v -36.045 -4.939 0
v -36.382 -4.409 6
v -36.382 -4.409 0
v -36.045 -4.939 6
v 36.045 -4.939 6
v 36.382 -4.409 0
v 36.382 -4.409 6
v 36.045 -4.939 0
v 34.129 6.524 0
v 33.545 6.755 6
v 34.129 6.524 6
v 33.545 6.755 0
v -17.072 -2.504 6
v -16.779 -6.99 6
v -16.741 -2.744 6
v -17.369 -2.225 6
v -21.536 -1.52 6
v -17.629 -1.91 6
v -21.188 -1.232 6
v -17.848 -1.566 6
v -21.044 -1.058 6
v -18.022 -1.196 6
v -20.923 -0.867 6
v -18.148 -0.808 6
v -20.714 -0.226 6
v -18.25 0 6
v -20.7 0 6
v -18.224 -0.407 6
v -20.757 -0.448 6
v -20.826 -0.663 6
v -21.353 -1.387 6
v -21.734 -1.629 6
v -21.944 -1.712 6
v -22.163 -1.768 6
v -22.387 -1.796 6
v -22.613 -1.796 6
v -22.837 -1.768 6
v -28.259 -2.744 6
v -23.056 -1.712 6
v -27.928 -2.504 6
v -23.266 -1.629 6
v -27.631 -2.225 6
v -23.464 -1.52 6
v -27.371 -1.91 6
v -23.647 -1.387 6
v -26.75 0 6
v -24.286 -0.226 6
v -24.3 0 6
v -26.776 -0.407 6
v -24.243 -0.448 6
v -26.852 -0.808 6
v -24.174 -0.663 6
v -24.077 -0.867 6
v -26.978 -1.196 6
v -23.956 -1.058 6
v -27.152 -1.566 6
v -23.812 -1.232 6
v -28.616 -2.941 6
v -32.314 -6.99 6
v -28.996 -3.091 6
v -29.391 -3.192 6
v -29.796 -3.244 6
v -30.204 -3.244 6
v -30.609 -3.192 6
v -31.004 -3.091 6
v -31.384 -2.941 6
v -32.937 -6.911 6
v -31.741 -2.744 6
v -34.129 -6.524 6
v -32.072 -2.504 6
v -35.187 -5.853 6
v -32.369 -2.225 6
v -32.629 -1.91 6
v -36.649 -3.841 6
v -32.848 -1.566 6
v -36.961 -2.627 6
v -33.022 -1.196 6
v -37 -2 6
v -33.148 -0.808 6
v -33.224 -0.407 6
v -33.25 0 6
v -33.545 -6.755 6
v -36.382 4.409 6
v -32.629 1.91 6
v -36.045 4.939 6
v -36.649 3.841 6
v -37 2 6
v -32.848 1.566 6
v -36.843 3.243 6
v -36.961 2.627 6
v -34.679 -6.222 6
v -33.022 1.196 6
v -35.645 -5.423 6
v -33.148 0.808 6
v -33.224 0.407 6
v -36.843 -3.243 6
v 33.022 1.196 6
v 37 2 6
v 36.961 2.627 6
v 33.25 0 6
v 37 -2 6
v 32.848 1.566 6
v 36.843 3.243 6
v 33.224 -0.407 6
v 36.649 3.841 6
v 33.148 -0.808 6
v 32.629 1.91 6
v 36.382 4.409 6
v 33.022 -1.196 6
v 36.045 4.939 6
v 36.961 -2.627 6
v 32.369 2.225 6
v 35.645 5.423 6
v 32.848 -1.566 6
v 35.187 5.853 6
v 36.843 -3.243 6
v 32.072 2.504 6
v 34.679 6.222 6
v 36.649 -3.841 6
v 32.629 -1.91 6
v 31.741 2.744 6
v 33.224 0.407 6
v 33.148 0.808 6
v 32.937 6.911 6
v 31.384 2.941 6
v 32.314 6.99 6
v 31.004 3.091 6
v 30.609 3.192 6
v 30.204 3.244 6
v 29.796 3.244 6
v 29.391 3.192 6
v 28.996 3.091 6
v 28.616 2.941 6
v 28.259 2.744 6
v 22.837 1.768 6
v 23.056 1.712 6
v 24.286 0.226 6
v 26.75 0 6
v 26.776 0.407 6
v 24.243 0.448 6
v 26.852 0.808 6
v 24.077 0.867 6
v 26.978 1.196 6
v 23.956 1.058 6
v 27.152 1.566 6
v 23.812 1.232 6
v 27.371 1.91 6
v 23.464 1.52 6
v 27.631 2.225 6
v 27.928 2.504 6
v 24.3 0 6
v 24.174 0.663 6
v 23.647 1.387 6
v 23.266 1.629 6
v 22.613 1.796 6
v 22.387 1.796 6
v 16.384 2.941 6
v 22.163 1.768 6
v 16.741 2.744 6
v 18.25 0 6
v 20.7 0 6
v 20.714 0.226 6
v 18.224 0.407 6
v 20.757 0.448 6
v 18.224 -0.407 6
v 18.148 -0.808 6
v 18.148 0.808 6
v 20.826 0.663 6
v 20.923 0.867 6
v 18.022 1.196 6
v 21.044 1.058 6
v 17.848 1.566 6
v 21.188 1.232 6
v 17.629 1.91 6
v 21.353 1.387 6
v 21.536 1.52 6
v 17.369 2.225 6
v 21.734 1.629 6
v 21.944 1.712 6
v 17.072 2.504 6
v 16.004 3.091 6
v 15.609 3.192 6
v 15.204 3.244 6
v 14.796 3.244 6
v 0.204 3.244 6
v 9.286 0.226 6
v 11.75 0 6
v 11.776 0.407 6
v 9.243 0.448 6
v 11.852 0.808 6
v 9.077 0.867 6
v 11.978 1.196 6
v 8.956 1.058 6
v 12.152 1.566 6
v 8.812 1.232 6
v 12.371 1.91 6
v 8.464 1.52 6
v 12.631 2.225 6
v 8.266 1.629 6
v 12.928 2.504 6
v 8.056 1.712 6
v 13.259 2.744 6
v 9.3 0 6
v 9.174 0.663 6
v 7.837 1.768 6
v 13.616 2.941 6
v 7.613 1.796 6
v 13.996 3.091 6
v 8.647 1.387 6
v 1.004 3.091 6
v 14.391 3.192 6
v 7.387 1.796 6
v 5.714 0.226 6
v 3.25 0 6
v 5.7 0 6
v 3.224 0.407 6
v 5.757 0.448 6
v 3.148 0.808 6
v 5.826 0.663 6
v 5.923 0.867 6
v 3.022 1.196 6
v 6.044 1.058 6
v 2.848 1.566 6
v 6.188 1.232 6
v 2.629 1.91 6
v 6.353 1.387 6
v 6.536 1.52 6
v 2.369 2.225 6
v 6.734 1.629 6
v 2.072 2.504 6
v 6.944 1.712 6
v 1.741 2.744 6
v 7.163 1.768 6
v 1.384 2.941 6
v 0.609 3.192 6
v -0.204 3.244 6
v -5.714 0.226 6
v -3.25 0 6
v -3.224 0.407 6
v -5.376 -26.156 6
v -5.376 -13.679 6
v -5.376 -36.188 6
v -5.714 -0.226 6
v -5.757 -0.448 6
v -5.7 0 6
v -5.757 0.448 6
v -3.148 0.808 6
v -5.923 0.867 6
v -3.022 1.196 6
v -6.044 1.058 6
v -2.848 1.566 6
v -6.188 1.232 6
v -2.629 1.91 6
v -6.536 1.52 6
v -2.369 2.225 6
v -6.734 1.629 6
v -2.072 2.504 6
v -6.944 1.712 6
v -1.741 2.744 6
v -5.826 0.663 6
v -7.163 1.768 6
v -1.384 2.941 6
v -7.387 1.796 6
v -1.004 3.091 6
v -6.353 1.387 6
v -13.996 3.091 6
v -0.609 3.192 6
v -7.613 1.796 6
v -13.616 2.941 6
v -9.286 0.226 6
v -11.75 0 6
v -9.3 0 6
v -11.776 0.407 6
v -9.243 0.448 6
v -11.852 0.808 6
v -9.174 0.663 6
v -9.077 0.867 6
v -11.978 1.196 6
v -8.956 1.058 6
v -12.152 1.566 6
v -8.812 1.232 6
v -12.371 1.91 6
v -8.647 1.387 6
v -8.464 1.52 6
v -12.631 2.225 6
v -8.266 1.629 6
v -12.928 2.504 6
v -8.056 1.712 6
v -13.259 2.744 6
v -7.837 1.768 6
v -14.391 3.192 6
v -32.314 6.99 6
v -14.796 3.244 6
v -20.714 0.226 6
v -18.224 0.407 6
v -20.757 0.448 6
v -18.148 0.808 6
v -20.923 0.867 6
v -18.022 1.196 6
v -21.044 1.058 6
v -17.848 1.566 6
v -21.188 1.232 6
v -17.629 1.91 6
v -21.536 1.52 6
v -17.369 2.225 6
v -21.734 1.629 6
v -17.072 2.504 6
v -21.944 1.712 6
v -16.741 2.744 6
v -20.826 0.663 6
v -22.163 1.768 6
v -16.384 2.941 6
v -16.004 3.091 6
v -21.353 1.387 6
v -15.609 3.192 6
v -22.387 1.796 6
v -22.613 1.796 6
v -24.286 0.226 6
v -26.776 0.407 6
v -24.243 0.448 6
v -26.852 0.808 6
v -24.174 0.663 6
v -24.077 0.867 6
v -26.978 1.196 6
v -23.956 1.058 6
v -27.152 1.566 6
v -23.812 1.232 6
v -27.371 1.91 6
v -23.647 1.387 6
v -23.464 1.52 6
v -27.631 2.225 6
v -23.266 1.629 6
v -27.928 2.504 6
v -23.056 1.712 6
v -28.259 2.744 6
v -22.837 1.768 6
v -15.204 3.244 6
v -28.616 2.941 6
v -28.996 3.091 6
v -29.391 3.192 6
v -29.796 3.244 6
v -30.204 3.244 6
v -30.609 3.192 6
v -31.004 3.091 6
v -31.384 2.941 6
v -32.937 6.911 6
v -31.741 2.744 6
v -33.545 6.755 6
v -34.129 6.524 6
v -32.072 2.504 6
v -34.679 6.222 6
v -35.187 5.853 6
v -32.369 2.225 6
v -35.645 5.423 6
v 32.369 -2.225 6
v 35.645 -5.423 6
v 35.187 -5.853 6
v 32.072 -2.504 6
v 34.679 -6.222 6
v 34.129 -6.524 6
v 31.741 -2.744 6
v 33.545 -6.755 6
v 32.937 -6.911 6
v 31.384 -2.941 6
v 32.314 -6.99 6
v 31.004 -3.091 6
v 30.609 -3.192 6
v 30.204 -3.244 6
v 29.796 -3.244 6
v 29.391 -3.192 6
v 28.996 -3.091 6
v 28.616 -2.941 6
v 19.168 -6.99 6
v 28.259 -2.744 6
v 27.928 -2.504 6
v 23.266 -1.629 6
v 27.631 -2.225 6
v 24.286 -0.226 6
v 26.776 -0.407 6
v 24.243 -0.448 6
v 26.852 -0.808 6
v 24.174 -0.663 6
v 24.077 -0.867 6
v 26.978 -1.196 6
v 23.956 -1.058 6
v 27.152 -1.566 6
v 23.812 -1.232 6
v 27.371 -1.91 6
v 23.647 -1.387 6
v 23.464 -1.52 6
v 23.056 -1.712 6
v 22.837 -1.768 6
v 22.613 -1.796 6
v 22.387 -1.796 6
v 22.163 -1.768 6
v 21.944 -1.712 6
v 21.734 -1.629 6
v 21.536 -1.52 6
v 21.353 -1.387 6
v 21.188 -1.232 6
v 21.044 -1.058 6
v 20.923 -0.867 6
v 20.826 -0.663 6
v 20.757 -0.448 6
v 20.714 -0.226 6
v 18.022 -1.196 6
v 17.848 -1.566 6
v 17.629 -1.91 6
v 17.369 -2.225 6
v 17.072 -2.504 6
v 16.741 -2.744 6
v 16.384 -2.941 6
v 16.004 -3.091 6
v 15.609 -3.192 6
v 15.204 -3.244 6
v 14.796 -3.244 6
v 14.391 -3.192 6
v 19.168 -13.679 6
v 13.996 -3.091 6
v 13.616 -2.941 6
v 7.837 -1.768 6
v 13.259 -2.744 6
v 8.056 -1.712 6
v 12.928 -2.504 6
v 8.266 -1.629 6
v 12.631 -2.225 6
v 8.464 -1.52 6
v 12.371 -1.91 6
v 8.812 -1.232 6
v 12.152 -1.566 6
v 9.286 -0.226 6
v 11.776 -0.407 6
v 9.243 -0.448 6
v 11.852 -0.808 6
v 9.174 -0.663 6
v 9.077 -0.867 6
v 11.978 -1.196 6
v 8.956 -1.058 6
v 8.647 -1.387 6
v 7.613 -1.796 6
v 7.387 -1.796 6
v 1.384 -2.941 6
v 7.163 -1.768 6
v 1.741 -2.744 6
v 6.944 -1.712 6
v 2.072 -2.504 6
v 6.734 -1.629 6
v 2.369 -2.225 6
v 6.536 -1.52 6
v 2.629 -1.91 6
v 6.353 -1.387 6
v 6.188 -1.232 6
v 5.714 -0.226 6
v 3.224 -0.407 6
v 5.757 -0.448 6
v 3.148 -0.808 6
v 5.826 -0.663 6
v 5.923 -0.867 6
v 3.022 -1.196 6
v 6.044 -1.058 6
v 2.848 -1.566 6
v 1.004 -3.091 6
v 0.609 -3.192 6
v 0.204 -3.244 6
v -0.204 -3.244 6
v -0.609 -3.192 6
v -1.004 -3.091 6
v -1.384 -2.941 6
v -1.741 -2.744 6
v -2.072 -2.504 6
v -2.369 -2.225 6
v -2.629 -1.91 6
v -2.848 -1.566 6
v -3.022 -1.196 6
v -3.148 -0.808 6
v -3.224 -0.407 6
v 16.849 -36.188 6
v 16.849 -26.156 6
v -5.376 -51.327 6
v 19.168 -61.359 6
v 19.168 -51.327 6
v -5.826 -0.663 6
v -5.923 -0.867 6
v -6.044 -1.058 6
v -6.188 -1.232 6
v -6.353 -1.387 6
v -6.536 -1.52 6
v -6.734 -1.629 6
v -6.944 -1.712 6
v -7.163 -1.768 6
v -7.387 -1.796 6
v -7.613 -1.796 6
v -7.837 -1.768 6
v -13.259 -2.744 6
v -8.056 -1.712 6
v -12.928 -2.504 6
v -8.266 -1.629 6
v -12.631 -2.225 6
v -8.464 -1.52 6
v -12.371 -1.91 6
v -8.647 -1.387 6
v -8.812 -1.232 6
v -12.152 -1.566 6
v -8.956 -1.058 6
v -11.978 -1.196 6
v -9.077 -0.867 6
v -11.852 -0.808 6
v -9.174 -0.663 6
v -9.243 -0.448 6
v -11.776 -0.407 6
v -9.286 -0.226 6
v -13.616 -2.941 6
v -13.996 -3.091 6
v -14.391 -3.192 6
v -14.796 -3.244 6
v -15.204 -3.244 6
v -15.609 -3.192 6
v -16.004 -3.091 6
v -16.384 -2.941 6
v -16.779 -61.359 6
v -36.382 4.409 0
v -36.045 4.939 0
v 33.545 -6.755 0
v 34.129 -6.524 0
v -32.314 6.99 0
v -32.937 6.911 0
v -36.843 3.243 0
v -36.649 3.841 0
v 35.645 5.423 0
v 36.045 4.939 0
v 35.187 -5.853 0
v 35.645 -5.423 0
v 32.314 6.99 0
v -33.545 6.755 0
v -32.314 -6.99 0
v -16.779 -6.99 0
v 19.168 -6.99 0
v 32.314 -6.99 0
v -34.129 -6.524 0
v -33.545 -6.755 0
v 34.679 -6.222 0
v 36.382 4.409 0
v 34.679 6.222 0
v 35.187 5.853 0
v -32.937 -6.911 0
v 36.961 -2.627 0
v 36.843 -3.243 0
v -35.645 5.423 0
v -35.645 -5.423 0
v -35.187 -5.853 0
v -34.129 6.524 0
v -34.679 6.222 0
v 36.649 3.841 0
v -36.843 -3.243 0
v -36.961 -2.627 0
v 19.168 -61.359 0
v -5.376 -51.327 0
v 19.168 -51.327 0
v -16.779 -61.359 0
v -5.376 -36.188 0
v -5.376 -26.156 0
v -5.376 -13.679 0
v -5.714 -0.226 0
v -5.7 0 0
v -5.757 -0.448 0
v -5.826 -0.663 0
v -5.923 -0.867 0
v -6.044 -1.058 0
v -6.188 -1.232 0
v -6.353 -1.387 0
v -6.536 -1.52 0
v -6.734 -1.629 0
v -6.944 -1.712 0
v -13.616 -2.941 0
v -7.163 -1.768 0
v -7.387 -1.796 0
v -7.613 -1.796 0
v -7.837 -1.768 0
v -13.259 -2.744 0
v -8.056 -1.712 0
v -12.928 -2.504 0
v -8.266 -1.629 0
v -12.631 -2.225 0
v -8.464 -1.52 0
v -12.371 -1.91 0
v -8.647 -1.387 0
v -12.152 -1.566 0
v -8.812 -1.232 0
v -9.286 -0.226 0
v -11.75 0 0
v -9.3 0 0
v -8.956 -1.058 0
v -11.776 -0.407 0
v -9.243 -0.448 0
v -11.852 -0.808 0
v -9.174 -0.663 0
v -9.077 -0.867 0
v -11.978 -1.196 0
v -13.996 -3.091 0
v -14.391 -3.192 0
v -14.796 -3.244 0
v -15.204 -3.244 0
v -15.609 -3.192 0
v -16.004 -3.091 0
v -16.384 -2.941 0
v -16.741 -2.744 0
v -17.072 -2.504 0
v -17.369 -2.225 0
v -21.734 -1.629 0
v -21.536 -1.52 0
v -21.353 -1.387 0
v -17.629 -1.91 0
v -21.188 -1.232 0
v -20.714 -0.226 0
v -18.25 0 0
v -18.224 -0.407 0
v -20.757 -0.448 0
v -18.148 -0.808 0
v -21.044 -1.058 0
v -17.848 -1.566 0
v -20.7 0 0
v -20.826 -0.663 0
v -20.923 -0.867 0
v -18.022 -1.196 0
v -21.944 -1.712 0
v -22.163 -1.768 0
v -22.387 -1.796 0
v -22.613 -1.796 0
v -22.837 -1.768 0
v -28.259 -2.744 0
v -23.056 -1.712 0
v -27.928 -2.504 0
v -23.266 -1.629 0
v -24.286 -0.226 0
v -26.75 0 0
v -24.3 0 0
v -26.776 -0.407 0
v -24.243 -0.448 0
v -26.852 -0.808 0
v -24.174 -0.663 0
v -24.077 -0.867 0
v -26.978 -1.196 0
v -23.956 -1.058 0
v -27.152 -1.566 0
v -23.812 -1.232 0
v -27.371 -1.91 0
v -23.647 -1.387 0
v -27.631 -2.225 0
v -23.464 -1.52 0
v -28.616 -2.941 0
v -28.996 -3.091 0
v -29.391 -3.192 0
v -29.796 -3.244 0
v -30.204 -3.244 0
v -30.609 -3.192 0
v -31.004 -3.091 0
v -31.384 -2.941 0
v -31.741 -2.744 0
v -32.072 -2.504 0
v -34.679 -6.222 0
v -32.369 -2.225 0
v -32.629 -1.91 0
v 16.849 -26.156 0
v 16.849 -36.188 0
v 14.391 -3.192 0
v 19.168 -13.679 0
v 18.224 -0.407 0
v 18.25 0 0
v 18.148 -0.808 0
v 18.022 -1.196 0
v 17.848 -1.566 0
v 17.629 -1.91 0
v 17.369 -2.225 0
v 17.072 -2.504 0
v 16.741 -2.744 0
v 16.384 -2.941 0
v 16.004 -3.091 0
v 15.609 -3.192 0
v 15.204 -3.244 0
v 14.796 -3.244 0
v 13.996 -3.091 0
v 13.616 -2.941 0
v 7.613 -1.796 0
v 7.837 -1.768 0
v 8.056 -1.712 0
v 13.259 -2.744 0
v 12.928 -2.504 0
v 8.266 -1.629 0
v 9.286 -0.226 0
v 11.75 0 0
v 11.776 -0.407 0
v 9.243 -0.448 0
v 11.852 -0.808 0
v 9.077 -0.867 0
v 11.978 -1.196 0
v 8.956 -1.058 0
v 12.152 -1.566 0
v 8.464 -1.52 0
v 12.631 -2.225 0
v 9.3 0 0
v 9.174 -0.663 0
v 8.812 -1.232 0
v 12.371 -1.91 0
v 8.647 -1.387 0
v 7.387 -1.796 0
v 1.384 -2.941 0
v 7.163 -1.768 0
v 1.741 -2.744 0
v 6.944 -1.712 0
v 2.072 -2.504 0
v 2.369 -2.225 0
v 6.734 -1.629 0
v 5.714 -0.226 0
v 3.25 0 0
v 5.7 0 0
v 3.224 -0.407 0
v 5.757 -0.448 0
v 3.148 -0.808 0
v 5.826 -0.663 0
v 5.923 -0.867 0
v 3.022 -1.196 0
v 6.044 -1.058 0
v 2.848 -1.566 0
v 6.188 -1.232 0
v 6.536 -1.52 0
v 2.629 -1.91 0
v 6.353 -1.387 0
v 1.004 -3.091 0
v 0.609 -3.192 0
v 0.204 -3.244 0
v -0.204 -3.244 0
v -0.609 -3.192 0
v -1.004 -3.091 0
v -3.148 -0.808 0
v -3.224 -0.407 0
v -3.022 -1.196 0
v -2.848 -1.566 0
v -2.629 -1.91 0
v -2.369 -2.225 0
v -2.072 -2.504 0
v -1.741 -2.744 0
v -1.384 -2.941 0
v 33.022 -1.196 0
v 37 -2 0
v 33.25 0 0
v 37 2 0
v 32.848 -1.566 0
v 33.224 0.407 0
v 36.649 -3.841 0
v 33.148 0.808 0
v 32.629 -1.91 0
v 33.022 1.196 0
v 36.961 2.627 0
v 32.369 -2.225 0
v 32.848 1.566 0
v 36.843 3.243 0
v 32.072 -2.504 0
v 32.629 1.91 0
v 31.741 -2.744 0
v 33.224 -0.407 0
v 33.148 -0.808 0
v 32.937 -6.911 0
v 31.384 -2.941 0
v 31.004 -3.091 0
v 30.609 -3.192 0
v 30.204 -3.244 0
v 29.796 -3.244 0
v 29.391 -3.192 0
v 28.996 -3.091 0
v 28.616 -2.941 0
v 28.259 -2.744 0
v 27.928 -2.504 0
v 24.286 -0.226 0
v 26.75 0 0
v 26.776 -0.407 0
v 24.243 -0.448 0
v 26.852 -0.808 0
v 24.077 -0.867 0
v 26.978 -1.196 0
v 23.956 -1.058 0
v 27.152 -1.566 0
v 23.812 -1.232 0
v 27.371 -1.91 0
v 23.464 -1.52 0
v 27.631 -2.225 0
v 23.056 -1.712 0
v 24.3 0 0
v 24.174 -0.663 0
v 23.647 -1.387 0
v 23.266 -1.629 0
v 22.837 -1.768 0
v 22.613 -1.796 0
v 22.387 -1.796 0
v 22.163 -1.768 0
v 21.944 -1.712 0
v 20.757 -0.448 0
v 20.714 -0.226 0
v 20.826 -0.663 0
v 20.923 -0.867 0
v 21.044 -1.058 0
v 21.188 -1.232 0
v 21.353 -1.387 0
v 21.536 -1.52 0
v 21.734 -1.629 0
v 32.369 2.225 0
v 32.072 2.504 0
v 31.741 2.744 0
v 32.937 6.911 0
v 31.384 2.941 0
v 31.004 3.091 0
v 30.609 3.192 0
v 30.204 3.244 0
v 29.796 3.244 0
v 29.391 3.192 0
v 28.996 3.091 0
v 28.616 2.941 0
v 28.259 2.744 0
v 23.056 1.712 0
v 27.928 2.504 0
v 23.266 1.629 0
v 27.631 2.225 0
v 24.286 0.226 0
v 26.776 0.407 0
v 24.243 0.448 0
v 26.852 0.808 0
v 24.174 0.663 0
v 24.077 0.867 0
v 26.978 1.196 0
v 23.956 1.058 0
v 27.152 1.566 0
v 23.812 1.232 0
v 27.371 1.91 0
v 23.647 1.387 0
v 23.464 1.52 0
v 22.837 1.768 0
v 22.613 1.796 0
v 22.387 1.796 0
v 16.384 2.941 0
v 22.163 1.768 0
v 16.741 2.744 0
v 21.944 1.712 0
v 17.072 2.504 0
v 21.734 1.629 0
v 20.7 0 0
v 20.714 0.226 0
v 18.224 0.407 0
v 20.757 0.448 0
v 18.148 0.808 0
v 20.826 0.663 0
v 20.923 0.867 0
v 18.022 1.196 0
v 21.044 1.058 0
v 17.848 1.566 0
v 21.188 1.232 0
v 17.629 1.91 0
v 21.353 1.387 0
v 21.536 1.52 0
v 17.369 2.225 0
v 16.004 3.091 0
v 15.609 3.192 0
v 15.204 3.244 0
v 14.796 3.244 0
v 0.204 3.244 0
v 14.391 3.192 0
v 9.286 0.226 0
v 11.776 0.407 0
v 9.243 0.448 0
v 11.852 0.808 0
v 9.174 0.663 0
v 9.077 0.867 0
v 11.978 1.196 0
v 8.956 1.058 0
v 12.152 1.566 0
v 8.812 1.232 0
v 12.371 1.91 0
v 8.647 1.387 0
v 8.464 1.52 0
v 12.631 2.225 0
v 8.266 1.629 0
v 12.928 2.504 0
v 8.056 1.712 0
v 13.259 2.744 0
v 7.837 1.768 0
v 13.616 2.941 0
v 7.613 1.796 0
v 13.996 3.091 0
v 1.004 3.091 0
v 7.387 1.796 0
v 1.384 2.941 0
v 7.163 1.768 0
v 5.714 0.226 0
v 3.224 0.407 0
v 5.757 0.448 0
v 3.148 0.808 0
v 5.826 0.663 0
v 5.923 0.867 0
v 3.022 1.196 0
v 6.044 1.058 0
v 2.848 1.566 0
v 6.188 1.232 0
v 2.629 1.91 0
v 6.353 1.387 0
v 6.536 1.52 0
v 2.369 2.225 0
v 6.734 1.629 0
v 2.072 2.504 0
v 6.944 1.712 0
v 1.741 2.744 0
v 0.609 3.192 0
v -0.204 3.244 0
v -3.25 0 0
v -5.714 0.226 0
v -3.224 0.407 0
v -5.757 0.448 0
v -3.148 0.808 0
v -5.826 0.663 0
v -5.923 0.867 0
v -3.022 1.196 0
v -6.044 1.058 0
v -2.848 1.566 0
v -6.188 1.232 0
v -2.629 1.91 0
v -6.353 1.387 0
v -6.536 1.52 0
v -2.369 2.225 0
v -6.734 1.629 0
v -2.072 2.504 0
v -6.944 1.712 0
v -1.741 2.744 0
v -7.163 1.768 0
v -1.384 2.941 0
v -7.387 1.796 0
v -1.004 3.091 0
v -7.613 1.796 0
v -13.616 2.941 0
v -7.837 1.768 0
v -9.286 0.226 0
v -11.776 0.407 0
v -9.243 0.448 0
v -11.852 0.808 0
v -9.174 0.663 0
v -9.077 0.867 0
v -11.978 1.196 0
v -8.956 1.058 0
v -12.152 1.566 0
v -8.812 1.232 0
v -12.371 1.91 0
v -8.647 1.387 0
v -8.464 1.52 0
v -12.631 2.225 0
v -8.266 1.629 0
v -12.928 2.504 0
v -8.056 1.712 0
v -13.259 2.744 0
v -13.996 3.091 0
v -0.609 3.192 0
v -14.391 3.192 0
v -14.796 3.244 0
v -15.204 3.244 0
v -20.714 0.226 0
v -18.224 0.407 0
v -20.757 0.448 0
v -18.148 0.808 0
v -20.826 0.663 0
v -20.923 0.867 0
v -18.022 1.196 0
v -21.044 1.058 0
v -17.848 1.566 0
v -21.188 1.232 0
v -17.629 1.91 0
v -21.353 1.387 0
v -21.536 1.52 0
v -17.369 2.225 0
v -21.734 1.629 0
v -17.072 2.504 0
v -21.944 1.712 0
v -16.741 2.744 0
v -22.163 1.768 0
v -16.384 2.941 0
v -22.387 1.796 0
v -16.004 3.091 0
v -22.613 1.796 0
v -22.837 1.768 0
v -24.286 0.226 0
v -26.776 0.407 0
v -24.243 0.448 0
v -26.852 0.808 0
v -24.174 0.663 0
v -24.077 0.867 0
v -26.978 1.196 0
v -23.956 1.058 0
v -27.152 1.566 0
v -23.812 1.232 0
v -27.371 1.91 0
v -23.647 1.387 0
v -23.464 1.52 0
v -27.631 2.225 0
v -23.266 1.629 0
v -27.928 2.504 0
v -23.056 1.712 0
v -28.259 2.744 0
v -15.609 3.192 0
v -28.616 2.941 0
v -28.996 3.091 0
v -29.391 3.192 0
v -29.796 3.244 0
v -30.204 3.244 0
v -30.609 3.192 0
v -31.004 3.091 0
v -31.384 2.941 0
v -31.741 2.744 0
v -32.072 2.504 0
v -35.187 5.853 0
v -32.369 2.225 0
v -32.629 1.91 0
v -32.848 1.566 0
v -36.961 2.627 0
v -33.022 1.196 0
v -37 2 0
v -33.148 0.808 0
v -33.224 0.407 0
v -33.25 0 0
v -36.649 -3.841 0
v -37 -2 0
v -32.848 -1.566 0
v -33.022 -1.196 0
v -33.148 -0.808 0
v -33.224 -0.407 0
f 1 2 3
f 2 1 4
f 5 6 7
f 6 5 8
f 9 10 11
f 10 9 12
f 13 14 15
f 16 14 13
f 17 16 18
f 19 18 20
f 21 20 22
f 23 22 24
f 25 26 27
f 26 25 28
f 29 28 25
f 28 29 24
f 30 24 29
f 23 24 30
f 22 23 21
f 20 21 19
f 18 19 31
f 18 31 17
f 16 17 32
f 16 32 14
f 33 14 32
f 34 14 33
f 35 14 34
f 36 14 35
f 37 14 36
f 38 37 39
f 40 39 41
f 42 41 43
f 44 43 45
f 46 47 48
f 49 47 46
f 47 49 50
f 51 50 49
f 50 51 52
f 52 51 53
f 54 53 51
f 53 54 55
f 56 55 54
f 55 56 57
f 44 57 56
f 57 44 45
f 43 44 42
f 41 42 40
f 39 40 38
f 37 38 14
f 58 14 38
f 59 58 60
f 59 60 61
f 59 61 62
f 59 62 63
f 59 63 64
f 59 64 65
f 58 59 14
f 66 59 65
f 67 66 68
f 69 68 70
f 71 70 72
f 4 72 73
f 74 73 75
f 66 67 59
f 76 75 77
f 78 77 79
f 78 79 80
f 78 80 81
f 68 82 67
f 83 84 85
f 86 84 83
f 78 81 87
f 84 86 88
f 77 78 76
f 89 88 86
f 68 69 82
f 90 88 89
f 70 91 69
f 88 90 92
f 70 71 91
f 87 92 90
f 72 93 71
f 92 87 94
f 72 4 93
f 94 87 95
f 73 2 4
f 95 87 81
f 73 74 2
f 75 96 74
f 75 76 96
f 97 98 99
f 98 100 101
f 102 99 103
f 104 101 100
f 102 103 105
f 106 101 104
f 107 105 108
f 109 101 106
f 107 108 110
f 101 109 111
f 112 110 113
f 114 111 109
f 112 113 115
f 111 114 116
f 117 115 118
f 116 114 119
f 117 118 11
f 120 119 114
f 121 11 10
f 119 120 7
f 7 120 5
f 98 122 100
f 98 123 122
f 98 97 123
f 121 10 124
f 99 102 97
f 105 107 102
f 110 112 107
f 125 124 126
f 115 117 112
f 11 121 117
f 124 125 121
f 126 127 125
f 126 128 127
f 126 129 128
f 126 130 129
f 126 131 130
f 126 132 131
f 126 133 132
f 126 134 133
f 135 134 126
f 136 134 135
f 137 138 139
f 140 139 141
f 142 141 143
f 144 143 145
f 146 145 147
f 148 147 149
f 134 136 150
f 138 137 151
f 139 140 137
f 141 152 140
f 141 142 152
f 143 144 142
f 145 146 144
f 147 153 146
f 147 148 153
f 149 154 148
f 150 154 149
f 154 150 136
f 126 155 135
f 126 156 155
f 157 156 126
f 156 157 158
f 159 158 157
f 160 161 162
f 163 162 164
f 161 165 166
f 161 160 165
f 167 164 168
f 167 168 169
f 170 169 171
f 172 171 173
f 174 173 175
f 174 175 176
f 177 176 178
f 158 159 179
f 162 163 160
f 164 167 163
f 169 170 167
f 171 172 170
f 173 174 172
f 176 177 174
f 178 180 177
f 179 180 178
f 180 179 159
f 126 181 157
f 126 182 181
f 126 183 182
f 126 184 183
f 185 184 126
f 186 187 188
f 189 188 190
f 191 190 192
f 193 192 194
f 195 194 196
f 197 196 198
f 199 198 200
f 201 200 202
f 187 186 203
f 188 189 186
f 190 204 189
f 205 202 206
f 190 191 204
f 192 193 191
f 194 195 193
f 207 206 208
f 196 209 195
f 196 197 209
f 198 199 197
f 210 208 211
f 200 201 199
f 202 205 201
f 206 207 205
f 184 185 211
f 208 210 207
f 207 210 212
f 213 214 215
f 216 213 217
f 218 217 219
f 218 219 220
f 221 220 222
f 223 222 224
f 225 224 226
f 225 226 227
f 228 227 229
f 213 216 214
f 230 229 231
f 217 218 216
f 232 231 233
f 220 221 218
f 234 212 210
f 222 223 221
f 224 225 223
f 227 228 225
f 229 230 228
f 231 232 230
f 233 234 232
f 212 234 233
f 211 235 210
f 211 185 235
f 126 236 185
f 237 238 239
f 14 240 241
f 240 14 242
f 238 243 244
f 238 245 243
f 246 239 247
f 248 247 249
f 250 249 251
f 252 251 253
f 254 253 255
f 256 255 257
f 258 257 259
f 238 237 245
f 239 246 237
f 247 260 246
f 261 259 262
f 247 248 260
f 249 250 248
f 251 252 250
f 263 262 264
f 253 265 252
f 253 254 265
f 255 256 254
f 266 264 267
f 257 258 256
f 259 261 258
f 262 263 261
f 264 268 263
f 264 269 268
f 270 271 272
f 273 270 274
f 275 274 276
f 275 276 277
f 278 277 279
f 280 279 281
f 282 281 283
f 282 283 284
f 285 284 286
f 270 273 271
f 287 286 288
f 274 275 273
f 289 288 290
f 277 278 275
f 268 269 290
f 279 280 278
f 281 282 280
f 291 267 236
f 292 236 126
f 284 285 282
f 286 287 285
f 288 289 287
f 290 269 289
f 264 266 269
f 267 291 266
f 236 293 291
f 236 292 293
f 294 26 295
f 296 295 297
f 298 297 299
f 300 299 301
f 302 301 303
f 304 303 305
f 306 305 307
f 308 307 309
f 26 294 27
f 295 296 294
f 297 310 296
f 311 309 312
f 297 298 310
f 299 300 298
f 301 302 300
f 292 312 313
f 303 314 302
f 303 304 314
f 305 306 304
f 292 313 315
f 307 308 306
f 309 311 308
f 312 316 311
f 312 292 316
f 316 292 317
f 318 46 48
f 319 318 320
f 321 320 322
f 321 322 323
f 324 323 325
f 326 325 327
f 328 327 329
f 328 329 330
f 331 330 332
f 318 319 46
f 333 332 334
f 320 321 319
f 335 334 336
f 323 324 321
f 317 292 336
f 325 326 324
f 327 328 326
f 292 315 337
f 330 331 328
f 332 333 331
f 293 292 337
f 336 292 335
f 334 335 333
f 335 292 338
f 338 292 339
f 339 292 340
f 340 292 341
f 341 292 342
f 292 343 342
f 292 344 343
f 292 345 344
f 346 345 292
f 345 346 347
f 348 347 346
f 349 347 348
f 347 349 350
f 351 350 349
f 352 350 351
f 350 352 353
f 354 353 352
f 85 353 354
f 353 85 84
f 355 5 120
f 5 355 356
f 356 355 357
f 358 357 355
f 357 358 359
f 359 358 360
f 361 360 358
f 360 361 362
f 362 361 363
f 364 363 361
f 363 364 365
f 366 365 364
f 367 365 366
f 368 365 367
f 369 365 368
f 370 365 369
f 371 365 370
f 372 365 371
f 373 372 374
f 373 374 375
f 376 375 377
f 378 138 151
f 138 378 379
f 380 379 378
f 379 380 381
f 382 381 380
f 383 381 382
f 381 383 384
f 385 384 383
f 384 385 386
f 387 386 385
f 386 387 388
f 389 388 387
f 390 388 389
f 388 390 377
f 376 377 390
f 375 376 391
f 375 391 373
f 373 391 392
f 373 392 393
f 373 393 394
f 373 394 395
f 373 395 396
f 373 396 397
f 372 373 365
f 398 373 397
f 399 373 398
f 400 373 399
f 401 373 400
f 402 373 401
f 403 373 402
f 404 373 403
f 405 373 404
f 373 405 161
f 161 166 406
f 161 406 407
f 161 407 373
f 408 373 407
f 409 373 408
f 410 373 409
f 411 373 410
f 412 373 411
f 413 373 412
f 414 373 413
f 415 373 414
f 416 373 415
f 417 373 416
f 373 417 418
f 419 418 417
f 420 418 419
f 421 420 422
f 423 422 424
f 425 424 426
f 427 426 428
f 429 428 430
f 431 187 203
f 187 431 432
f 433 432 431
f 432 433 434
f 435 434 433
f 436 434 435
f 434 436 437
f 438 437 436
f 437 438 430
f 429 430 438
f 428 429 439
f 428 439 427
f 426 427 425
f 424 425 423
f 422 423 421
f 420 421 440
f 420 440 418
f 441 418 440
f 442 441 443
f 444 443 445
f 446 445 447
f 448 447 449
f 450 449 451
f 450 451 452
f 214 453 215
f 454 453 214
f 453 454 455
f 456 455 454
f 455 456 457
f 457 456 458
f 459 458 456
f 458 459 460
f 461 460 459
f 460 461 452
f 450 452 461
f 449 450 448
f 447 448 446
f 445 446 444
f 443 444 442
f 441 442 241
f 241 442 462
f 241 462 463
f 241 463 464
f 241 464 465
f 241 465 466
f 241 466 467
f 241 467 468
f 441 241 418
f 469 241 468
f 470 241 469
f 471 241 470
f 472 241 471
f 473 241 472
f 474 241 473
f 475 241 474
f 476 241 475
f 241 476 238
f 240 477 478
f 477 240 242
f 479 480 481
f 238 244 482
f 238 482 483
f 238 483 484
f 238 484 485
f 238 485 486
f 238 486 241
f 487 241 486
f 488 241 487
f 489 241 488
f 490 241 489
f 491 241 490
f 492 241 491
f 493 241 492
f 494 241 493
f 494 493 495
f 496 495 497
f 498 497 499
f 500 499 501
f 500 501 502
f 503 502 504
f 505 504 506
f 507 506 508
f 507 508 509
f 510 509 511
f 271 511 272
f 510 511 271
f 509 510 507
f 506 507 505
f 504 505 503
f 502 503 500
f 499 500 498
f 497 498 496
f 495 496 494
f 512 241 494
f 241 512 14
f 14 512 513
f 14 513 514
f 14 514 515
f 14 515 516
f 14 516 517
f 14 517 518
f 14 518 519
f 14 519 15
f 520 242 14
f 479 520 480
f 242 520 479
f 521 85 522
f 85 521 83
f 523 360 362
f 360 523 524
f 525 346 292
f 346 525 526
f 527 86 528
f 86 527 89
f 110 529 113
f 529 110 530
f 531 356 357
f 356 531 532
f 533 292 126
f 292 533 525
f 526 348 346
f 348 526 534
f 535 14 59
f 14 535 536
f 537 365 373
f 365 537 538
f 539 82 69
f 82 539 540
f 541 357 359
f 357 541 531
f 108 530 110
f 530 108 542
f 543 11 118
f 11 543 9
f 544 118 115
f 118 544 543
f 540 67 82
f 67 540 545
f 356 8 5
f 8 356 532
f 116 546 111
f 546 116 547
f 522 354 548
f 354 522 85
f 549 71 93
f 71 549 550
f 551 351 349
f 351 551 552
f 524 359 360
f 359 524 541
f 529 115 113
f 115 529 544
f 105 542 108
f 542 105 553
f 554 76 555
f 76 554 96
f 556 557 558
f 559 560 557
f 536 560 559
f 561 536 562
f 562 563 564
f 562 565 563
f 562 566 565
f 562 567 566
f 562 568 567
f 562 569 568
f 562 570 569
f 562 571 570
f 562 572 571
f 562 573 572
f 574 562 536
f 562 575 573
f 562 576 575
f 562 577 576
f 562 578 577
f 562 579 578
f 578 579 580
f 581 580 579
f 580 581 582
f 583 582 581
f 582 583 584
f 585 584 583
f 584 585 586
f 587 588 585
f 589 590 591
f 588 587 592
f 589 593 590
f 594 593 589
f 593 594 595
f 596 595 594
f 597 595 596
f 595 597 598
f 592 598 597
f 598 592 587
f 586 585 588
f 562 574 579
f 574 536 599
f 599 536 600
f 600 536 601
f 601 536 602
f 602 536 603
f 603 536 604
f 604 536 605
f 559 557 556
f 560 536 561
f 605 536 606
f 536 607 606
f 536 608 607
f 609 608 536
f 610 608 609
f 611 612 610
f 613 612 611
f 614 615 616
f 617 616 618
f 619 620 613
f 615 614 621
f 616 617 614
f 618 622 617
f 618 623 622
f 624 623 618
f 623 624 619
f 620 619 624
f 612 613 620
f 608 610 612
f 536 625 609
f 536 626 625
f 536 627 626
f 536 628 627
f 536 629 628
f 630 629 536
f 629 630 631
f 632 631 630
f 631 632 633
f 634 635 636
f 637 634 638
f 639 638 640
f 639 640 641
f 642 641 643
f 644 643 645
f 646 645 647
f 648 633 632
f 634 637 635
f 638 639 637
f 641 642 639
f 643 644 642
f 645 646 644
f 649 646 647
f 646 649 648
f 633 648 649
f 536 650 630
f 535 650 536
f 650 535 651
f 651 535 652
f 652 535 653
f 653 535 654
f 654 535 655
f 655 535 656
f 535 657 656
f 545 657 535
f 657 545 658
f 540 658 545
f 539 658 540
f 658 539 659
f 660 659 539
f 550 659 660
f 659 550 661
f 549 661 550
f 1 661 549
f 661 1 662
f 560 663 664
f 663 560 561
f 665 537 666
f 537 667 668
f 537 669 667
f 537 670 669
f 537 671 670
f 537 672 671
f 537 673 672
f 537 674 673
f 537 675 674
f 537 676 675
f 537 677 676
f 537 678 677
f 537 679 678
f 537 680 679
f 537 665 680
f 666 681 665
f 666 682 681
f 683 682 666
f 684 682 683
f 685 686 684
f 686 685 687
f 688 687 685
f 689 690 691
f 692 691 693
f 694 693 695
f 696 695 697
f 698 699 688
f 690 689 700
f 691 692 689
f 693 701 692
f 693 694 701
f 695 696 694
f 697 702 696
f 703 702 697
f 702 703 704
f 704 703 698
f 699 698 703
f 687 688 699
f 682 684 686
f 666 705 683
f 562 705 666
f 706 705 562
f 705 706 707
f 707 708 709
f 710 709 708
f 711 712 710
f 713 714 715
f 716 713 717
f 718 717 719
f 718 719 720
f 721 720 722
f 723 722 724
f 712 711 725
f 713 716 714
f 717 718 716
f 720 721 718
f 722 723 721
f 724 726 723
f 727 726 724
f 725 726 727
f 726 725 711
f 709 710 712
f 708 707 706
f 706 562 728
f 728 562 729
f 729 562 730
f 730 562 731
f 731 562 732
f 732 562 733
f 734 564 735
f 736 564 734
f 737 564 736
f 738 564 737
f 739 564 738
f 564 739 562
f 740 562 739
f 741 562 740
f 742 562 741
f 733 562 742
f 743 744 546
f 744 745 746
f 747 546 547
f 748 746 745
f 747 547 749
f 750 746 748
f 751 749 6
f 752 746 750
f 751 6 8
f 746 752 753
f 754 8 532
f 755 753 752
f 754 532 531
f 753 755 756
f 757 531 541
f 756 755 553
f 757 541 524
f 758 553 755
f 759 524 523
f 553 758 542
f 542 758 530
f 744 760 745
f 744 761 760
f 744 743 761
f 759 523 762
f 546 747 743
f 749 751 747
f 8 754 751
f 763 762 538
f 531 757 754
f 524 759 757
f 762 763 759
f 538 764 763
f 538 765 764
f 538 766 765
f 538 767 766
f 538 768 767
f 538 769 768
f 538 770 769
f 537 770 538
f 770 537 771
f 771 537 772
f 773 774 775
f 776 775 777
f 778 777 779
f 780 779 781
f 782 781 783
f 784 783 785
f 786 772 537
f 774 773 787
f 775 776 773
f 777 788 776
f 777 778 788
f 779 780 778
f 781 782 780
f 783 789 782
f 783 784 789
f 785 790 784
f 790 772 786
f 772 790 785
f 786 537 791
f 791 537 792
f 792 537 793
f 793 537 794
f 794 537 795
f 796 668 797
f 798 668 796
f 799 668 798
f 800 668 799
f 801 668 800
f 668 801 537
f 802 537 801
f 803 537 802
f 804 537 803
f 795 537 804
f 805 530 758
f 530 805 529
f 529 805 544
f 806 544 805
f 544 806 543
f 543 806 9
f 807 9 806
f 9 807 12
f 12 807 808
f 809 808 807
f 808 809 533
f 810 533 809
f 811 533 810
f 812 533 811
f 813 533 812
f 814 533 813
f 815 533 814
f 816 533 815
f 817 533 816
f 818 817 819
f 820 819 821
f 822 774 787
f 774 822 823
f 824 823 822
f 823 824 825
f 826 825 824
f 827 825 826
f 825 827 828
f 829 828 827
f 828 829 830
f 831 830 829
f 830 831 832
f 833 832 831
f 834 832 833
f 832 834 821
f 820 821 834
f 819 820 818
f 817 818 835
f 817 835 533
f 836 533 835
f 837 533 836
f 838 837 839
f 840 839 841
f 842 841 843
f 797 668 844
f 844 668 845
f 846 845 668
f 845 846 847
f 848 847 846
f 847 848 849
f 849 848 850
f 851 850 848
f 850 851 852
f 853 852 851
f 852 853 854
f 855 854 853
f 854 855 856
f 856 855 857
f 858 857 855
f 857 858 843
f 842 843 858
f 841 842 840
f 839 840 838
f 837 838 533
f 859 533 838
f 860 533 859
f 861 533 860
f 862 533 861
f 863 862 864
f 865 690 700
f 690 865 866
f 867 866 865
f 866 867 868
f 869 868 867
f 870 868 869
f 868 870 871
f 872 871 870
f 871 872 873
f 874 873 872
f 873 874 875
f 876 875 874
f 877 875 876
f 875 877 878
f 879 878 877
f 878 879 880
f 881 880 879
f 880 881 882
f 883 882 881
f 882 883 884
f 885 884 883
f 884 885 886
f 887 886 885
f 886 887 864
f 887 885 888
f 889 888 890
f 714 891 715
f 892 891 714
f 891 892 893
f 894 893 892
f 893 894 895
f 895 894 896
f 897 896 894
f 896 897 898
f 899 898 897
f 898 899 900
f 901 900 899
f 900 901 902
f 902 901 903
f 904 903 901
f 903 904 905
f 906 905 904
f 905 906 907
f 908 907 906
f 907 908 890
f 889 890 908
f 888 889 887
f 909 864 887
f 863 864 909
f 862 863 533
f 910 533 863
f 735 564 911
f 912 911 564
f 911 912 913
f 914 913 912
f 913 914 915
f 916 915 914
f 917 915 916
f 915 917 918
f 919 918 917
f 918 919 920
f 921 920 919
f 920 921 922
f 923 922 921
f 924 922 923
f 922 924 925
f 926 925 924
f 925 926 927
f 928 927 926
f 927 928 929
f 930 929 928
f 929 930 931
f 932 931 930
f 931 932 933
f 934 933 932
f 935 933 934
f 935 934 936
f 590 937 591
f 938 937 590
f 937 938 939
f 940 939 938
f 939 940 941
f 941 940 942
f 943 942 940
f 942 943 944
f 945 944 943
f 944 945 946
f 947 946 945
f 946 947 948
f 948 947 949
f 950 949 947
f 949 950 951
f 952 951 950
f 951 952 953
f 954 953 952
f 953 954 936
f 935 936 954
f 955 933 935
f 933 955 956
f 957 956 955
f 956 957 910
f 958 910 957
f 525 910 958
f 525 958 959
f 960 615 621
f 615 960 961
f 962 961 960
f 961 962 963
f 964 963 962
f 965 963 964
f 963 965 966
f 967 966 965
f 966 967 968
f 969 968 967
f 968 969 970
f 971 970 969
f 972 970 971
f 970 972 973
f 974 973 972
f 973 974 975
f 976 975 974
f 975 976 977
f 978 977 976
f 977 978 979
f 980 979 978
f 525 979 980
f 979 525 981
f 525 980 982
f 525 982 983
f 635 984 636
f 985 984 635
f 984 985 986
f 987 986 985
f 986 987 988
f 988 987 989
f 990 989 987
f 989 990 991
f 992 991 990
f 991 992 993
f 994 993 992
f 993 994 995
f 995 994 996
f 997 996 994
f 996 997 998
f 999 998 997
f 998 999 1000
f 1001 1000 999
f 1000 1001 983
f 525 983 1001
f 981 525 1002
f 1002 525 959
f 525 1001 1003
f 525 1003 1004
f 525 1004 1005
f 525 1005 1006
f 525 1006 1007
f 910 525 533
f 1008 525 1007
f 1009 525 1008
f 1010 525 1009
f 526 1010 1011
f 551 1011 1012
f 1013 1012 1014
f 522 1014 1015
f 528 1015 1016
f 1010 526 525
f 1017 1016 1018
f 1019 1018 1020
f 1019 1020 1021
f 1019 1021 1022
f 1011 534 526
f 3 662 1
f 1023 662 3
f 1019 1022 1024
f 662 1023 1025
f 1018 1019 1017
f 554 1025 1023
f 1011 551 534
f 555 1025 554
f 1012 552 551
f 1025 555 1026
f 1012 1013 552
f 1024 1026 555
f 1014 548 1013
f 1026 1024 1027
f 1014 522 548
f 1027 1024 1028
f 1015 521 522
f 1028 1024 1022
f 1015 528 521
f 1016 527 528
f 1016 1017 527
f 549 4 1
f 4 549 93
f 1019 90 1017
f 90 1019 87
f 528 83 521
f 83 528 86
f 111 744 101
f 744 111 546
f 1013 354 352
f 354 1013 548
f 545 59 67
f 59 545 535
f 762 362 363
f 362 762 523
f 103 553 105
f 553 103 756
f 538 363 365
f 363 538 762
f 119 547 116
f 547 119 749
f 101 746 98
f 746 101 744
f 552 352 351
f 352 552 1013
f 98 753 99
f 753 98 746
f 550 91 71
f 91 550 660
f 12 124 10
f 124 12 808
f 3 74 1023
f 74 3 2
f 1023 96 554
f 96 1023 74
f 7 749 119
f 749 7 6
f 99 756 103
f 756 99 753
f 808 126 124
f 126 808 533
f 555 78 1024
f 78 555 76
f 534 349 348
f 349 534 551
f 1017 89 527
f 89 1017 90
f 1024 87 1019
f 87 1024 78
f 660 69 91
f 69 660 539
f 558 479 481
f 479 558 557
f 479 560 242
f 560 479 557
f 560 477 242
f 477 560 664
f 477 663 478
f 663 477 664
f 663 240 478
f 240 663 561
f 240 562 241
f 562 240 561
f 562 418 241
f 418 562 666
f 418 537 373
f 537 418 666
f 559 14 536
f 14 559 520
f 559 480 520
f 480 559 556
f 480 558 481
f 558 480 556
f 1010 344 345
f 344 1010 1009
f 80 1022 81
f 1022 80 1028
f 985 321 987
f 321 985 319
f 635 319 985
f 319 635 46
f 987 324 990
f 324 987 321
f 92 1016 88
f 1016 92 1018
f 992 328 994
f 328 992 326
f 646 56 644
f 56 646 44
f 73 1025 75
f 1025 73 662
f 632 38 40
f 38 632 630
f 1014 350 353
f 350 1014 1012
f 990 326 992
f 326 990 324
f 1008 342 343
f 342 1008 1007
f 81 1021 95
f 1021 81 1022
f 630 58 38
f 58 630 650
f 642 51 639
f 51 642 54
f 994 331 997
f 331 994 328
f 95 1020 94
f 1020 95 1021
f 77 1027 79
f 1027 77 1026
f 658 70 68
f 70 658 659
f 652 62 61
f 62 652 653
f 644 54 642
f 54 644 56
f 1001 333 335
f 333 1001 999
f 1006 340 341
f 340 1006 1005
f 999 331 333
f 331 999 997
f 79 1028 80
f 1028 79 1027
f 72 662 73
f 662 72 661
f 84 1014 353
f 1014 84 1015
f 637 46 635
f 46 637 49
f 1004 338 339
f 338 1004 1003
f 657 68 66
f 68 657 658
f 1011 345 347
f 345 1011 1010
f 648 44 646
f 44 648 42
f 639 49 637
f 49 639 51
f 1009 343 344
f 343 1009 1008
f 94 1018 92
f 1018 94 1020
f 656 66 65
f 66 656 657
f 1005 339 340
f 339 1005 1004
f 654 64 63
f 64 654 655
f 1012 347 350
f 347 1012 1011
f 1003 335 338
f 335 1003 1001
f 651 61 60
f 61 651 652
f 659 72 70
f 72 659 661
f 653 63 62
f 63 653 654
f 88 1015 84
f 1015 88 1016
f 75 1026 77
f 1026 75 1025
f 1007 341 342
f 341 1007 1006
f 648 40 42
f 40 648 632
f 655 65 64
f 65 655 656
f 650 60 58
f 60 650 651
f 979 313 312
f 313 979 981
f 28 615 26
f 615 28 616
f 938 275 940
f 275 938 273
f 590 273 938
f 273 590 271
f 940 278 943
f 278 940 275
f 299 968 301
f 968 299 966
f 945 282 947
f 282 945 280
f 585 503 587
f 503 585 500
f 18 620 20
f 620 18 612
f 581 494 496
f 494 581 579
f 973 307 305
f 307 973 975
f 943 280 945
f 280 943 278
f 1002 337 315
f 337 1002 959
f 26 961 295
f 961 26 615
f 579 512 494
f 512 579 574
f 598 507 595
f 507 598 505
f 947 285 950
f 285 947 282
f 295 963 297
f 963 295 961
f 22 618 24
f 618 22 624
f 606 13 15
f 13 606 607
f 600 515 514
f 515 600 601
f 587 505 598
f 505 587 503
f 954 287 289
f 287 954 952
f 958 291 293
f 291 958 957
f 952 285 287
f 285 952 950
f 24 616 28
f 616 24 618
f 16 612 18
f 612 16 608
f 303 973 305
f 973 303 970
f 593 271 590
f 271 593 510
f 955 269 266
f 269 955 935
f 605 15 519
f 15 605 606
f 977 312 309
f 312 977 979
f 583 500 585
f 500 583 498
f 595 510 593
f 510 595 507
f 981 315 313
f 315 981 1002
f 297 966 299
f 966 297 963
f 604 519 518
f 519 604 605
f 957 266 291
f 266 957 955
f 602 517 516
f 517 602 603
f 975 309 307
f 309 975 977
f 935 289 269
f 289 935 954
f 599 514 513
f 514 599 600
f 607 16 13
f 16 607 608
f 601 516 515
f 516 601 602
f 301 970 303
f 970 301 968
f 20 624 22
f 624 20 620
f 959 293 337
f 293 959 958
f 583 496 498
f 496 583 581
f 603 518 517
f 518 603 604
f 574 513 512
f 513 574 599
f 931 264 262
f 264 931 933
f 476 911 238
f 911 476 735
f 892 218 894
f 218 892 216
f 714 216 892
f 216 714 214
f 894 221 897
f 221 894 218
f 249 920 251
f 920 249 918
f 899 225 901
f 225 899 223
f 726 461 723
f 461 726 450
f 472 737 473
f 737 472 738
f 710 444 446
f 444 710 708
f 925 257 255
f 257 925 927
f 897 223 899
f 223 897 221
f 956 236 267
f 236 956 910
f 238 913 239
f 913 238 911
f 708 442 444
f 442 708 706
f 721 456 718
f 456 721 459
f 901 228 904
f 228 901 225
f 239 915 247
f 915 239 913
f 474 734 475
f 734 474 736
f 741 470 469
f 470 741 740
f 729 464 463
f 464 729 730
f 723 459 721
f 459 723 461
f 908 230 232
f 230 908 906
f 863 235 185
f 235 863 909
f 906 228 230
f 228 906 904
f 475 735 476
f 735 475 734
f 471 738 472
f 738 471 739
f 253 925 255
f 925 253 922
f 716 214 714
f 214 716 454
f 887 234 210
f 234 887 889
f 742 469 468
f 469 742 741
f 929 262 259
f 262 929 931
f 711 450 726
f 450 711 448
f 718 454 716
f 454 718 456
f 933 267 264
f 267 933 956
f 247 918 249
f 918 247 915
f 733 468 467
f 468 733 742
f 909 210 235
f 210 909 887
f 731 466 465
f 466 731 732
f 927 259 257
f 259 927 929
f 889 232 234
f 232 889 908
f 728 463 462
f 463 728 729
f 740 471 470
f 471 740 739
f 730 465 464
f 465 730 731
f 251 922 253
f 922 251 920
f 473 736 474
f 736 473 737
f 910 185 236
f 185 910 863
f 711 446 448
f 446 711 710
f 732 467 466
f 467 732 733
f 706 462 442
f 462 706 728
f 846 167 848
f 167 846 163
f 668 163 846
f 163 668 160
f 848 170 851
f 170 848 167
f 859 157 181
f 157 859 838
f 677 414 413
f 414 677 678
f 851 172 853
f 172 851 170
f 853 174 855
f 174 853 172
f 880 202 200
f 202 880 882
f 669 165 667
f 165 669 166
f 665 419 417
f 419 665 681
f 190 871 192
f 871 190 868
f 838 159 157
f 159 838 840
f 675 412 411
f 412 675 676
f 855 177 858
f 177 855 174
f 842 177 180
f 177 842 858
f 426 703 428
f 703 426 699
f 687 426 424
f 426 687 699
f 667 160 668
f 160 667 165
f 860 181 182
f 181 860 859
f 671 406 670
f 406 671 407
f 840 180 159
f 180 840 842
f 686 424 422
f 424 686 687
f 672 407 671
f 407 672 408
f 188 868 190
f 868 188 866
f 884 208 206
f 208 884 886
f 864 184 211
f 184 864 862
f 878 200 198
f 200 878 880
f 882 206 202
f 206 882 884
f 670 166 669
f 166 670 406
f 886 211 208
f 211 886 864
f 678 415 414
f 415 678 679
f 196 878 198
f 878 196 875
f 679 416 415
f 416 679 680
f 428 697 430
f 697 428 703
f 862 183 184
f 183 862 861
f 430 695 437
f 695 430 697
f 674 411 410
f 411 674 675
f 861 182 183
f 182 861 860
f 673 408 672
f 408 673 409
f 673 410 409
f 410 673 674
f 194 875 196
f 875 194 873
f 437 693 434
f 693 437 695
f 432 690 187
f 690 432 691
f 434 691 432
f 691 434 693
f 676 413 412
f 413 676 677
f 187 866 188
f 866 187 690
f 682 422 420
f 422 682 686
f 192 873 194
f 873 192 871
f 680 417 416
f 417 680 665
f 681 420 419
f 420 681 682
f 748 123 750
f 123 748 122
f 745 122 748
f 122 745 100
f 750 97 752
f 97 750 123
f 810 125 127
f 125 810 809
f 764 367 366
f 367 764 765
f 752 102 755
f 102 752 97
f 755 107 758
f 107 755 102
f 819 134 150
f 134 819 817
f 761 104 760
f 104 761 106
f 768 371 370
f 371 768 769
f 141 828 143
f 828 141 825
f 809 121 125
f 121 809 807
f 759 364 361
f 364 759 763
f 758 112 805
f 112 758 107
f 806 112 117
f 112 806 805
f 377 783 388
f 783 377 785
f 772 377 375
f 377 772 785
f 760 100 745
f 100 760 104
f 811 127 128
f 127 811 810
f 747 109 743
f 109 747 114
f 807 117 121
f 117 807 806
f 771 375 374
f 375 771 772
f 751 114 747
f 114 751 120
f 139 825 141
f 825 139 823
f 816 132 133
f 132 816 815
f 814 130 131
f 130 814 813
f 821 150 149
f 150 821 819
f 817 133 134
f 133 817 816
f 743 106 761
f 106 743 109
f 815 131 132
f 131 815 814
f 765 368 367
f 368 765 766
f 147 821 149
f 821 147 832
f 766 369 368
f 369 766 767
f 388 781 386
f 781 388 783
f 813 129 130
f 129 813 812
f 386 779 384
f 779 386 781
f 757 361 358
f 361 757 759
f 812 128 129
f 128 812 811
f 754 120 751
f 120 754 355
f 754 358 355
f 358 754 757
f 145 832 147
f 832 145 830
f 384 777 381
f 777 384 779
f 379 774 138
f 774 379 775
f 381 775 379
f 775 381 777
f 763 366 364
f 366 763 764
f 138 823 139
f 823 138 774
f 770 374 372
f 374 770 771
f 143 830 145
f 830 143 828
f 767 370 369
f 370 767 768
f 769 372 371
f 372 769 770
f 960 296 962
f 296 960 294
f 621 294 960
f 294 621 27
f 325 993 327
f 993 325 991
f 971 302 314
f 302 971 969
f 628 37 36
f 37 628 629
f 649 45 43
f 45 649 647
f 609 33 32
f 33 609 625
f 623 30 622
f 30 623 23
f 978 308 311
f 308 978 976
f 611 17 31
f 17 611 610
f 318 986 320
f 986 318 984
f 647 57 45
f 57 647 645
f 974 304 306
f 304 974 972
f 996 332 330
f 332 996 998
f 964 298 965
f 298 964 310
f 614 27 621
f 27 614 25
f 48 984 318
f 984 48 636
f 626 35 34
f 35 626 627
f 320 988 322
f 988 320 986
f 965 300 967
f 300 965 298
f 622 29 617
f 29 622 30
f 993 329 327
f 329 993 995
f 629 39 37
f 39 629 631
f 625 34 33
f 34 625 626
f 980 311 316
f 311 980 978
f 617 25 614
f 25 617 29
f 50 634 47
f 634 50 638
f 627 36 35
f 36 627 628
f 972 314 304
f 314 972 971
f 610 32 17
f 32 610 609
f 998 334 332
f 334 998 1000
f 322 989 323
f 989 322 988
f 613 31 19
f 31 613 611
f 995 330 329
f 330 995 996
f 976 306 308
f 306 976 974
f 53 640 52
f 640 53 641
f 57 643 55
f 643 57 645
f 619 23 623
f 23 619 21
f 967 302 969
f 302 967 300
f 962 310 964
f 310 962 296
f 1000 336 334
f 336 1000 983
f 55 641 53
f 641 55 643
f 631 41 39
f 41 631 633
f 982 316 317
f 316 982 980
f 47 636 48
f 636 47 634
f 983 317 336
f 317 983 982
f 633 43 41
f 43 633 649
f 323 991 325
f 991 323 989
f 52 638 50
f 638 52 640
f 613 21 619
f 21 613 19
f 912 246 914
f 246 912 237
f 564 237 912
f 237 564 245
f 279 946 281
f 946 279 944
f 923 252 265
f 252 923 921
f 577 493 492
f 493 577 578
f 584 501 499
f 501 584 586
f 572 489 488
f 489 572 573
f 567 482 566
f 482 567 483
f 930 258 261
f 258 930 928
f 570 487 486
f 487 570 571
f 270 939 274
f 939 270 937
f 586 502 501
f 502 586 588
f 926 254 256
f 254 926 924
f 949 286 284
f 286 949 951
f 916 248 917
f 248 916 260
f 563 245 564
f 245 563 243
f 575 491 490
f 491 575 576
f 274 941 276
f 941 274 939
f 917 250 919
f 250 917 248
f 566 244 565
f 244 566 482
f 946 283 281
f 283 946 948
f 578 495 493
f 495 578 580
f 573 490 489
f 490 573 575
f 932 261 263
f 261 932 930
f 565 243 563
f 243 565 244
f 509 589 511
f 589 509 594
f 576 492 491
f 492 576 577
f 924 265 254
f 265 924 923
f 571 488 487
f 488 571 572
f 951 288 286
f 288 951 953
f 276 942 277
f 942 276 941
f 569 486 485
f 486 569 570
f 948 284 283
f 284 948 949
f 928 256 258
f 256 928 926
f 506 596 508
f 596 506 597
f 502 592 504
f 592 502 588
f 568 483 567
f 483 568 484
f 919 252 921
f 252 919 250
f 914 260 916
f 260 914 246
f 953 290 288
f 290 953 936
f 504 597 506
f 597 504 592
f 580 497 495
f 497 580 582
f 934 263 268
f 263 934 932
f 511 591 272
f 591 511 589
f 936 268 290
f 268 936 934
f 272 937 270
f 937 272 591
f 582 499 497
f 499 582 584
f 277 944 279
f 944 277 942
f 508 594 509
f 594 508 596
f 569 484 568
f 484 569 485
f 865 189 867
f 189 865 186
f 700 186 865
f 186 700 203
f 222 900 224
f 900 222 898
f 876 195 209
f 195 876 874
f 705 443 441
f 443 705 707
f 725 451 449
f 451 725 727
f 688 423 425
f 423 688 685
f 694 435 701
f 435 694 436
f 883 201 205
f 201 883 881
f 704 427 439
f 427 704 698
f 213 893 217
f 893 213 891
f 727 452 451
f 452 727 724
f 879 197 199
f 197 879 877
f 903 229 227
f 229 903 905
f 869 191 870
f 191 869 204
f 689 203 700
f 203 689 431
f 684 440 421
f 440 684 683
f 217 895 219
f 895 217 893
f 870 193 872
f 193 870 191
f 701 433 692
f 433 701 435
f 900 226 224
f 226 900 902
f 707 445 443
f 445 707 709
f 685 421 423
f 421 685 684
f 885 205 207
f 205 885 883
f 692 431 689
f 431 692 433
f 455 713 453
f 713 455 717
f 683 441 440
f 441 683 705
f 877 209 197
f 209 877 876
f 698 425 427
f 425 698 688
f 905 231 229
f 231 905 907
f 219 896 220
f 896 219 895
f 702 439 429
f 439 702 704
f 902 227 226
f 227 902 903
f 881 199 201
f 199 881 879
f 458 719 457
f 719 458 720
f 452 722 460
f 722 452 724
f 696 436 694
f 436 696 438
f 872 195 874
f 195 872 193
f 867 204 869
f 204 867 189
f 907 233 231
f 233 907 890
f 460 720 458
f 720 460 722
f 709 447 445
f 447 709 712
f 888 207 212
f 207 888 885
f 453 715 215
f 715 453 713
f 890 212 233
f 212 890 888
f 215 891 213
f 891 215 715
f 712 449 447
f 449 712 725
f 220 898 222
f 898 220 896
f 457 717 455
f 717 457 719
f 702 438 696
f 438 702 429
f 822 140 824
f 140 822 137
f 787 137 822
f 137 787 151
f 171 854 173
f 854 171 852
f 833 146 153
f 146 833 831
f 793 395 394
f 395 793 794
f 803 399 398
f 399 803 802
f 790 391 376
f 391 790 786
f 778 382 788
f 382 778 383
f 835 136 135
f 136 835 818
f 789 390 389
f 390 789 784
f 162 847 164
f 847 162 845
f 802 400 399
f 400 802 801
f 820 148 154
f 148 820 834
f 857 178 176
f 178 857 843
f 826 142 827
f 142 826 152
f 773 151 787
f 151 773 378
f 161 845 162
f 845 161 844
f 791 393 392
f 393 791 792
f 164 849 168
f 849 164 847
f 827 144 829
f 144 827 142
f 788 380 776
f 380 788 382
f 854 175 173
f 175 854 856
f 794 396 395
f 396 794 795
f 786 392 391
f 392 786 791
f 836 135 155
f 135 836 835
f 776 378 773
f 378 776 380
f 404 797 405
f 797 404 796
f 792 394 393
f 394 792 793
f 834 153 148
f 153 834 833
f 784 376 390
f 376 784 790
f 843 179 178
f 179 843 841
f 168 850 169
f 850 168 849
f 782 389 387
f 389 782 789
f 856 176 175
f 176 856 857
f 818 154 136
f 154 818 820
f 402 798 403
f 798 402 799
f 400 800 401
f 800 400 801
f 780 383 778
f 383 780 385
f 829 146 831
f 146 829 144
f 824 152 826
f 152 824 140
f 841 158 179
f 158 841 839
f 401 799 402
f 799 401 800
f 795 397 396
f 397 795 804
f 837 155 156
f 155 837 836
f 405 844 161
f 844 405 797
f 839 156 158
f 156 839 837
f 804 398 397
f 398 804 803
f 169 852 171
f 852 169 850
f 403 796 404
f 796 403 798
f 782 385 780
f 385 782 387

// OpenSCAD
$fn = 50;


difference() {
	union() {
		hull() {
			translate(v = [-32.0000000000, 2.0000000000, 0]) {
				cylinder(h = 6, r = 5);
			}
			translate(v = [32.0000000000, 2.0000000000, 0]) {
				cylinder(h = 6, r = 5);
			}
			translate(v = [-32.0000000000, -2.0000000000, 0]) {
				cylinder(h = 6, r = 5);
			}
			translate(v = [32.0000000000, -2.0000000000, 0]) {
				cylinder(h = 6, r = 5);
			}
		}
		translate(v = [0, -5, 0]) {
			linear_extrude(height = 6) {
				text(font = "DejaVu Sans Mono:style=Bold", halign = "center", size = 57.0000000000, text = "E", valign = "top");
			}
		}
	}
	union() {
		translate(v = [-30.0000000000, 0.0000000000, 0]) {
			translate(v = [0, 0, -100]) {
				cylinder(h = 200, r = 3.2500000000);
			}
		}
		translate(v = [-15.0000000000, 0.0000000000, 0]) {
			translate(v = [0, 0, -100]) {
				cylinder(h = 200, r = 3.2500000000);
			}
		}
		translate(v = [0, 0, -100]) {
			cylinder(h = 200, r = 3.2500000000);
		}
		translate(v = [15.0000000000, 0.0000000000, 0]) {
			translate(v = [0, 0, -100]) {
				cylinder(h = 200, r = 3.2500000000);
			}
		}
		translate(v = [30.0000000000, 0.0000000000, 0]) {
			translate(v = [0, 0, -100]) {
				cylinder(h = 200, r = 3.2500000000);
			}
		}
		translate(v = [-30.0000000000, 0.0000000000, 0]) {
			translate(v = [0, 0, -100]) {
				cylinder(h = 200, r = 1.8000000000);
			}
		}
		translate(v = [-22.5000000000, 0.0000000000, 0]) {
			translate(v = [0, 0, -100]) {
				cylinder(h = 200, r = 1.8000000000);
			}
		}
		translate(v = [-15.0000000000, 0.0000000000, 0]) {
			translate(v = [0, 0, -100]) {
				cylinder(h = 200, r = 1.8000000000);
			}
		}
		translate(v = [-7.5000000000, 0.0000000000, 0]) {
			translate(v = [0, 0, -100]) {
				cylinder(h = 200, r = 1.8000000000);
			}
		}
		translate(v = [0, 0, -100]) {
			cylinder(h = 200, r = 1.8000000000);
		}
		translate(v = [7.5000000000, 0.0000000000, 0]) {
			translate(v = [0, 0, -100]) {
				cylinder(h = 200, r = 1.8000000000);
			}
		}
		translate(v = [15.0000000000, 0.0000000000, 0]) {
			translate(v = [0, 0, -100]) {
				cylinder(h = 200, r = 1.8000000000);
			}
		}
		translate(v = [22.5000000000, 0.0000000000, 0]) {
			translate(v = [0, 0, -100]) {
				cylinder(h = 200, r = 1.8000000000);
			}
		}
		translate(v = [30.0000000000, 0.0000000000, 0]) {
			translate(v = [0, 0, -100]) {
				cylinder(h = 200, r = 1.8000000000);
			}
		}
	}
}
